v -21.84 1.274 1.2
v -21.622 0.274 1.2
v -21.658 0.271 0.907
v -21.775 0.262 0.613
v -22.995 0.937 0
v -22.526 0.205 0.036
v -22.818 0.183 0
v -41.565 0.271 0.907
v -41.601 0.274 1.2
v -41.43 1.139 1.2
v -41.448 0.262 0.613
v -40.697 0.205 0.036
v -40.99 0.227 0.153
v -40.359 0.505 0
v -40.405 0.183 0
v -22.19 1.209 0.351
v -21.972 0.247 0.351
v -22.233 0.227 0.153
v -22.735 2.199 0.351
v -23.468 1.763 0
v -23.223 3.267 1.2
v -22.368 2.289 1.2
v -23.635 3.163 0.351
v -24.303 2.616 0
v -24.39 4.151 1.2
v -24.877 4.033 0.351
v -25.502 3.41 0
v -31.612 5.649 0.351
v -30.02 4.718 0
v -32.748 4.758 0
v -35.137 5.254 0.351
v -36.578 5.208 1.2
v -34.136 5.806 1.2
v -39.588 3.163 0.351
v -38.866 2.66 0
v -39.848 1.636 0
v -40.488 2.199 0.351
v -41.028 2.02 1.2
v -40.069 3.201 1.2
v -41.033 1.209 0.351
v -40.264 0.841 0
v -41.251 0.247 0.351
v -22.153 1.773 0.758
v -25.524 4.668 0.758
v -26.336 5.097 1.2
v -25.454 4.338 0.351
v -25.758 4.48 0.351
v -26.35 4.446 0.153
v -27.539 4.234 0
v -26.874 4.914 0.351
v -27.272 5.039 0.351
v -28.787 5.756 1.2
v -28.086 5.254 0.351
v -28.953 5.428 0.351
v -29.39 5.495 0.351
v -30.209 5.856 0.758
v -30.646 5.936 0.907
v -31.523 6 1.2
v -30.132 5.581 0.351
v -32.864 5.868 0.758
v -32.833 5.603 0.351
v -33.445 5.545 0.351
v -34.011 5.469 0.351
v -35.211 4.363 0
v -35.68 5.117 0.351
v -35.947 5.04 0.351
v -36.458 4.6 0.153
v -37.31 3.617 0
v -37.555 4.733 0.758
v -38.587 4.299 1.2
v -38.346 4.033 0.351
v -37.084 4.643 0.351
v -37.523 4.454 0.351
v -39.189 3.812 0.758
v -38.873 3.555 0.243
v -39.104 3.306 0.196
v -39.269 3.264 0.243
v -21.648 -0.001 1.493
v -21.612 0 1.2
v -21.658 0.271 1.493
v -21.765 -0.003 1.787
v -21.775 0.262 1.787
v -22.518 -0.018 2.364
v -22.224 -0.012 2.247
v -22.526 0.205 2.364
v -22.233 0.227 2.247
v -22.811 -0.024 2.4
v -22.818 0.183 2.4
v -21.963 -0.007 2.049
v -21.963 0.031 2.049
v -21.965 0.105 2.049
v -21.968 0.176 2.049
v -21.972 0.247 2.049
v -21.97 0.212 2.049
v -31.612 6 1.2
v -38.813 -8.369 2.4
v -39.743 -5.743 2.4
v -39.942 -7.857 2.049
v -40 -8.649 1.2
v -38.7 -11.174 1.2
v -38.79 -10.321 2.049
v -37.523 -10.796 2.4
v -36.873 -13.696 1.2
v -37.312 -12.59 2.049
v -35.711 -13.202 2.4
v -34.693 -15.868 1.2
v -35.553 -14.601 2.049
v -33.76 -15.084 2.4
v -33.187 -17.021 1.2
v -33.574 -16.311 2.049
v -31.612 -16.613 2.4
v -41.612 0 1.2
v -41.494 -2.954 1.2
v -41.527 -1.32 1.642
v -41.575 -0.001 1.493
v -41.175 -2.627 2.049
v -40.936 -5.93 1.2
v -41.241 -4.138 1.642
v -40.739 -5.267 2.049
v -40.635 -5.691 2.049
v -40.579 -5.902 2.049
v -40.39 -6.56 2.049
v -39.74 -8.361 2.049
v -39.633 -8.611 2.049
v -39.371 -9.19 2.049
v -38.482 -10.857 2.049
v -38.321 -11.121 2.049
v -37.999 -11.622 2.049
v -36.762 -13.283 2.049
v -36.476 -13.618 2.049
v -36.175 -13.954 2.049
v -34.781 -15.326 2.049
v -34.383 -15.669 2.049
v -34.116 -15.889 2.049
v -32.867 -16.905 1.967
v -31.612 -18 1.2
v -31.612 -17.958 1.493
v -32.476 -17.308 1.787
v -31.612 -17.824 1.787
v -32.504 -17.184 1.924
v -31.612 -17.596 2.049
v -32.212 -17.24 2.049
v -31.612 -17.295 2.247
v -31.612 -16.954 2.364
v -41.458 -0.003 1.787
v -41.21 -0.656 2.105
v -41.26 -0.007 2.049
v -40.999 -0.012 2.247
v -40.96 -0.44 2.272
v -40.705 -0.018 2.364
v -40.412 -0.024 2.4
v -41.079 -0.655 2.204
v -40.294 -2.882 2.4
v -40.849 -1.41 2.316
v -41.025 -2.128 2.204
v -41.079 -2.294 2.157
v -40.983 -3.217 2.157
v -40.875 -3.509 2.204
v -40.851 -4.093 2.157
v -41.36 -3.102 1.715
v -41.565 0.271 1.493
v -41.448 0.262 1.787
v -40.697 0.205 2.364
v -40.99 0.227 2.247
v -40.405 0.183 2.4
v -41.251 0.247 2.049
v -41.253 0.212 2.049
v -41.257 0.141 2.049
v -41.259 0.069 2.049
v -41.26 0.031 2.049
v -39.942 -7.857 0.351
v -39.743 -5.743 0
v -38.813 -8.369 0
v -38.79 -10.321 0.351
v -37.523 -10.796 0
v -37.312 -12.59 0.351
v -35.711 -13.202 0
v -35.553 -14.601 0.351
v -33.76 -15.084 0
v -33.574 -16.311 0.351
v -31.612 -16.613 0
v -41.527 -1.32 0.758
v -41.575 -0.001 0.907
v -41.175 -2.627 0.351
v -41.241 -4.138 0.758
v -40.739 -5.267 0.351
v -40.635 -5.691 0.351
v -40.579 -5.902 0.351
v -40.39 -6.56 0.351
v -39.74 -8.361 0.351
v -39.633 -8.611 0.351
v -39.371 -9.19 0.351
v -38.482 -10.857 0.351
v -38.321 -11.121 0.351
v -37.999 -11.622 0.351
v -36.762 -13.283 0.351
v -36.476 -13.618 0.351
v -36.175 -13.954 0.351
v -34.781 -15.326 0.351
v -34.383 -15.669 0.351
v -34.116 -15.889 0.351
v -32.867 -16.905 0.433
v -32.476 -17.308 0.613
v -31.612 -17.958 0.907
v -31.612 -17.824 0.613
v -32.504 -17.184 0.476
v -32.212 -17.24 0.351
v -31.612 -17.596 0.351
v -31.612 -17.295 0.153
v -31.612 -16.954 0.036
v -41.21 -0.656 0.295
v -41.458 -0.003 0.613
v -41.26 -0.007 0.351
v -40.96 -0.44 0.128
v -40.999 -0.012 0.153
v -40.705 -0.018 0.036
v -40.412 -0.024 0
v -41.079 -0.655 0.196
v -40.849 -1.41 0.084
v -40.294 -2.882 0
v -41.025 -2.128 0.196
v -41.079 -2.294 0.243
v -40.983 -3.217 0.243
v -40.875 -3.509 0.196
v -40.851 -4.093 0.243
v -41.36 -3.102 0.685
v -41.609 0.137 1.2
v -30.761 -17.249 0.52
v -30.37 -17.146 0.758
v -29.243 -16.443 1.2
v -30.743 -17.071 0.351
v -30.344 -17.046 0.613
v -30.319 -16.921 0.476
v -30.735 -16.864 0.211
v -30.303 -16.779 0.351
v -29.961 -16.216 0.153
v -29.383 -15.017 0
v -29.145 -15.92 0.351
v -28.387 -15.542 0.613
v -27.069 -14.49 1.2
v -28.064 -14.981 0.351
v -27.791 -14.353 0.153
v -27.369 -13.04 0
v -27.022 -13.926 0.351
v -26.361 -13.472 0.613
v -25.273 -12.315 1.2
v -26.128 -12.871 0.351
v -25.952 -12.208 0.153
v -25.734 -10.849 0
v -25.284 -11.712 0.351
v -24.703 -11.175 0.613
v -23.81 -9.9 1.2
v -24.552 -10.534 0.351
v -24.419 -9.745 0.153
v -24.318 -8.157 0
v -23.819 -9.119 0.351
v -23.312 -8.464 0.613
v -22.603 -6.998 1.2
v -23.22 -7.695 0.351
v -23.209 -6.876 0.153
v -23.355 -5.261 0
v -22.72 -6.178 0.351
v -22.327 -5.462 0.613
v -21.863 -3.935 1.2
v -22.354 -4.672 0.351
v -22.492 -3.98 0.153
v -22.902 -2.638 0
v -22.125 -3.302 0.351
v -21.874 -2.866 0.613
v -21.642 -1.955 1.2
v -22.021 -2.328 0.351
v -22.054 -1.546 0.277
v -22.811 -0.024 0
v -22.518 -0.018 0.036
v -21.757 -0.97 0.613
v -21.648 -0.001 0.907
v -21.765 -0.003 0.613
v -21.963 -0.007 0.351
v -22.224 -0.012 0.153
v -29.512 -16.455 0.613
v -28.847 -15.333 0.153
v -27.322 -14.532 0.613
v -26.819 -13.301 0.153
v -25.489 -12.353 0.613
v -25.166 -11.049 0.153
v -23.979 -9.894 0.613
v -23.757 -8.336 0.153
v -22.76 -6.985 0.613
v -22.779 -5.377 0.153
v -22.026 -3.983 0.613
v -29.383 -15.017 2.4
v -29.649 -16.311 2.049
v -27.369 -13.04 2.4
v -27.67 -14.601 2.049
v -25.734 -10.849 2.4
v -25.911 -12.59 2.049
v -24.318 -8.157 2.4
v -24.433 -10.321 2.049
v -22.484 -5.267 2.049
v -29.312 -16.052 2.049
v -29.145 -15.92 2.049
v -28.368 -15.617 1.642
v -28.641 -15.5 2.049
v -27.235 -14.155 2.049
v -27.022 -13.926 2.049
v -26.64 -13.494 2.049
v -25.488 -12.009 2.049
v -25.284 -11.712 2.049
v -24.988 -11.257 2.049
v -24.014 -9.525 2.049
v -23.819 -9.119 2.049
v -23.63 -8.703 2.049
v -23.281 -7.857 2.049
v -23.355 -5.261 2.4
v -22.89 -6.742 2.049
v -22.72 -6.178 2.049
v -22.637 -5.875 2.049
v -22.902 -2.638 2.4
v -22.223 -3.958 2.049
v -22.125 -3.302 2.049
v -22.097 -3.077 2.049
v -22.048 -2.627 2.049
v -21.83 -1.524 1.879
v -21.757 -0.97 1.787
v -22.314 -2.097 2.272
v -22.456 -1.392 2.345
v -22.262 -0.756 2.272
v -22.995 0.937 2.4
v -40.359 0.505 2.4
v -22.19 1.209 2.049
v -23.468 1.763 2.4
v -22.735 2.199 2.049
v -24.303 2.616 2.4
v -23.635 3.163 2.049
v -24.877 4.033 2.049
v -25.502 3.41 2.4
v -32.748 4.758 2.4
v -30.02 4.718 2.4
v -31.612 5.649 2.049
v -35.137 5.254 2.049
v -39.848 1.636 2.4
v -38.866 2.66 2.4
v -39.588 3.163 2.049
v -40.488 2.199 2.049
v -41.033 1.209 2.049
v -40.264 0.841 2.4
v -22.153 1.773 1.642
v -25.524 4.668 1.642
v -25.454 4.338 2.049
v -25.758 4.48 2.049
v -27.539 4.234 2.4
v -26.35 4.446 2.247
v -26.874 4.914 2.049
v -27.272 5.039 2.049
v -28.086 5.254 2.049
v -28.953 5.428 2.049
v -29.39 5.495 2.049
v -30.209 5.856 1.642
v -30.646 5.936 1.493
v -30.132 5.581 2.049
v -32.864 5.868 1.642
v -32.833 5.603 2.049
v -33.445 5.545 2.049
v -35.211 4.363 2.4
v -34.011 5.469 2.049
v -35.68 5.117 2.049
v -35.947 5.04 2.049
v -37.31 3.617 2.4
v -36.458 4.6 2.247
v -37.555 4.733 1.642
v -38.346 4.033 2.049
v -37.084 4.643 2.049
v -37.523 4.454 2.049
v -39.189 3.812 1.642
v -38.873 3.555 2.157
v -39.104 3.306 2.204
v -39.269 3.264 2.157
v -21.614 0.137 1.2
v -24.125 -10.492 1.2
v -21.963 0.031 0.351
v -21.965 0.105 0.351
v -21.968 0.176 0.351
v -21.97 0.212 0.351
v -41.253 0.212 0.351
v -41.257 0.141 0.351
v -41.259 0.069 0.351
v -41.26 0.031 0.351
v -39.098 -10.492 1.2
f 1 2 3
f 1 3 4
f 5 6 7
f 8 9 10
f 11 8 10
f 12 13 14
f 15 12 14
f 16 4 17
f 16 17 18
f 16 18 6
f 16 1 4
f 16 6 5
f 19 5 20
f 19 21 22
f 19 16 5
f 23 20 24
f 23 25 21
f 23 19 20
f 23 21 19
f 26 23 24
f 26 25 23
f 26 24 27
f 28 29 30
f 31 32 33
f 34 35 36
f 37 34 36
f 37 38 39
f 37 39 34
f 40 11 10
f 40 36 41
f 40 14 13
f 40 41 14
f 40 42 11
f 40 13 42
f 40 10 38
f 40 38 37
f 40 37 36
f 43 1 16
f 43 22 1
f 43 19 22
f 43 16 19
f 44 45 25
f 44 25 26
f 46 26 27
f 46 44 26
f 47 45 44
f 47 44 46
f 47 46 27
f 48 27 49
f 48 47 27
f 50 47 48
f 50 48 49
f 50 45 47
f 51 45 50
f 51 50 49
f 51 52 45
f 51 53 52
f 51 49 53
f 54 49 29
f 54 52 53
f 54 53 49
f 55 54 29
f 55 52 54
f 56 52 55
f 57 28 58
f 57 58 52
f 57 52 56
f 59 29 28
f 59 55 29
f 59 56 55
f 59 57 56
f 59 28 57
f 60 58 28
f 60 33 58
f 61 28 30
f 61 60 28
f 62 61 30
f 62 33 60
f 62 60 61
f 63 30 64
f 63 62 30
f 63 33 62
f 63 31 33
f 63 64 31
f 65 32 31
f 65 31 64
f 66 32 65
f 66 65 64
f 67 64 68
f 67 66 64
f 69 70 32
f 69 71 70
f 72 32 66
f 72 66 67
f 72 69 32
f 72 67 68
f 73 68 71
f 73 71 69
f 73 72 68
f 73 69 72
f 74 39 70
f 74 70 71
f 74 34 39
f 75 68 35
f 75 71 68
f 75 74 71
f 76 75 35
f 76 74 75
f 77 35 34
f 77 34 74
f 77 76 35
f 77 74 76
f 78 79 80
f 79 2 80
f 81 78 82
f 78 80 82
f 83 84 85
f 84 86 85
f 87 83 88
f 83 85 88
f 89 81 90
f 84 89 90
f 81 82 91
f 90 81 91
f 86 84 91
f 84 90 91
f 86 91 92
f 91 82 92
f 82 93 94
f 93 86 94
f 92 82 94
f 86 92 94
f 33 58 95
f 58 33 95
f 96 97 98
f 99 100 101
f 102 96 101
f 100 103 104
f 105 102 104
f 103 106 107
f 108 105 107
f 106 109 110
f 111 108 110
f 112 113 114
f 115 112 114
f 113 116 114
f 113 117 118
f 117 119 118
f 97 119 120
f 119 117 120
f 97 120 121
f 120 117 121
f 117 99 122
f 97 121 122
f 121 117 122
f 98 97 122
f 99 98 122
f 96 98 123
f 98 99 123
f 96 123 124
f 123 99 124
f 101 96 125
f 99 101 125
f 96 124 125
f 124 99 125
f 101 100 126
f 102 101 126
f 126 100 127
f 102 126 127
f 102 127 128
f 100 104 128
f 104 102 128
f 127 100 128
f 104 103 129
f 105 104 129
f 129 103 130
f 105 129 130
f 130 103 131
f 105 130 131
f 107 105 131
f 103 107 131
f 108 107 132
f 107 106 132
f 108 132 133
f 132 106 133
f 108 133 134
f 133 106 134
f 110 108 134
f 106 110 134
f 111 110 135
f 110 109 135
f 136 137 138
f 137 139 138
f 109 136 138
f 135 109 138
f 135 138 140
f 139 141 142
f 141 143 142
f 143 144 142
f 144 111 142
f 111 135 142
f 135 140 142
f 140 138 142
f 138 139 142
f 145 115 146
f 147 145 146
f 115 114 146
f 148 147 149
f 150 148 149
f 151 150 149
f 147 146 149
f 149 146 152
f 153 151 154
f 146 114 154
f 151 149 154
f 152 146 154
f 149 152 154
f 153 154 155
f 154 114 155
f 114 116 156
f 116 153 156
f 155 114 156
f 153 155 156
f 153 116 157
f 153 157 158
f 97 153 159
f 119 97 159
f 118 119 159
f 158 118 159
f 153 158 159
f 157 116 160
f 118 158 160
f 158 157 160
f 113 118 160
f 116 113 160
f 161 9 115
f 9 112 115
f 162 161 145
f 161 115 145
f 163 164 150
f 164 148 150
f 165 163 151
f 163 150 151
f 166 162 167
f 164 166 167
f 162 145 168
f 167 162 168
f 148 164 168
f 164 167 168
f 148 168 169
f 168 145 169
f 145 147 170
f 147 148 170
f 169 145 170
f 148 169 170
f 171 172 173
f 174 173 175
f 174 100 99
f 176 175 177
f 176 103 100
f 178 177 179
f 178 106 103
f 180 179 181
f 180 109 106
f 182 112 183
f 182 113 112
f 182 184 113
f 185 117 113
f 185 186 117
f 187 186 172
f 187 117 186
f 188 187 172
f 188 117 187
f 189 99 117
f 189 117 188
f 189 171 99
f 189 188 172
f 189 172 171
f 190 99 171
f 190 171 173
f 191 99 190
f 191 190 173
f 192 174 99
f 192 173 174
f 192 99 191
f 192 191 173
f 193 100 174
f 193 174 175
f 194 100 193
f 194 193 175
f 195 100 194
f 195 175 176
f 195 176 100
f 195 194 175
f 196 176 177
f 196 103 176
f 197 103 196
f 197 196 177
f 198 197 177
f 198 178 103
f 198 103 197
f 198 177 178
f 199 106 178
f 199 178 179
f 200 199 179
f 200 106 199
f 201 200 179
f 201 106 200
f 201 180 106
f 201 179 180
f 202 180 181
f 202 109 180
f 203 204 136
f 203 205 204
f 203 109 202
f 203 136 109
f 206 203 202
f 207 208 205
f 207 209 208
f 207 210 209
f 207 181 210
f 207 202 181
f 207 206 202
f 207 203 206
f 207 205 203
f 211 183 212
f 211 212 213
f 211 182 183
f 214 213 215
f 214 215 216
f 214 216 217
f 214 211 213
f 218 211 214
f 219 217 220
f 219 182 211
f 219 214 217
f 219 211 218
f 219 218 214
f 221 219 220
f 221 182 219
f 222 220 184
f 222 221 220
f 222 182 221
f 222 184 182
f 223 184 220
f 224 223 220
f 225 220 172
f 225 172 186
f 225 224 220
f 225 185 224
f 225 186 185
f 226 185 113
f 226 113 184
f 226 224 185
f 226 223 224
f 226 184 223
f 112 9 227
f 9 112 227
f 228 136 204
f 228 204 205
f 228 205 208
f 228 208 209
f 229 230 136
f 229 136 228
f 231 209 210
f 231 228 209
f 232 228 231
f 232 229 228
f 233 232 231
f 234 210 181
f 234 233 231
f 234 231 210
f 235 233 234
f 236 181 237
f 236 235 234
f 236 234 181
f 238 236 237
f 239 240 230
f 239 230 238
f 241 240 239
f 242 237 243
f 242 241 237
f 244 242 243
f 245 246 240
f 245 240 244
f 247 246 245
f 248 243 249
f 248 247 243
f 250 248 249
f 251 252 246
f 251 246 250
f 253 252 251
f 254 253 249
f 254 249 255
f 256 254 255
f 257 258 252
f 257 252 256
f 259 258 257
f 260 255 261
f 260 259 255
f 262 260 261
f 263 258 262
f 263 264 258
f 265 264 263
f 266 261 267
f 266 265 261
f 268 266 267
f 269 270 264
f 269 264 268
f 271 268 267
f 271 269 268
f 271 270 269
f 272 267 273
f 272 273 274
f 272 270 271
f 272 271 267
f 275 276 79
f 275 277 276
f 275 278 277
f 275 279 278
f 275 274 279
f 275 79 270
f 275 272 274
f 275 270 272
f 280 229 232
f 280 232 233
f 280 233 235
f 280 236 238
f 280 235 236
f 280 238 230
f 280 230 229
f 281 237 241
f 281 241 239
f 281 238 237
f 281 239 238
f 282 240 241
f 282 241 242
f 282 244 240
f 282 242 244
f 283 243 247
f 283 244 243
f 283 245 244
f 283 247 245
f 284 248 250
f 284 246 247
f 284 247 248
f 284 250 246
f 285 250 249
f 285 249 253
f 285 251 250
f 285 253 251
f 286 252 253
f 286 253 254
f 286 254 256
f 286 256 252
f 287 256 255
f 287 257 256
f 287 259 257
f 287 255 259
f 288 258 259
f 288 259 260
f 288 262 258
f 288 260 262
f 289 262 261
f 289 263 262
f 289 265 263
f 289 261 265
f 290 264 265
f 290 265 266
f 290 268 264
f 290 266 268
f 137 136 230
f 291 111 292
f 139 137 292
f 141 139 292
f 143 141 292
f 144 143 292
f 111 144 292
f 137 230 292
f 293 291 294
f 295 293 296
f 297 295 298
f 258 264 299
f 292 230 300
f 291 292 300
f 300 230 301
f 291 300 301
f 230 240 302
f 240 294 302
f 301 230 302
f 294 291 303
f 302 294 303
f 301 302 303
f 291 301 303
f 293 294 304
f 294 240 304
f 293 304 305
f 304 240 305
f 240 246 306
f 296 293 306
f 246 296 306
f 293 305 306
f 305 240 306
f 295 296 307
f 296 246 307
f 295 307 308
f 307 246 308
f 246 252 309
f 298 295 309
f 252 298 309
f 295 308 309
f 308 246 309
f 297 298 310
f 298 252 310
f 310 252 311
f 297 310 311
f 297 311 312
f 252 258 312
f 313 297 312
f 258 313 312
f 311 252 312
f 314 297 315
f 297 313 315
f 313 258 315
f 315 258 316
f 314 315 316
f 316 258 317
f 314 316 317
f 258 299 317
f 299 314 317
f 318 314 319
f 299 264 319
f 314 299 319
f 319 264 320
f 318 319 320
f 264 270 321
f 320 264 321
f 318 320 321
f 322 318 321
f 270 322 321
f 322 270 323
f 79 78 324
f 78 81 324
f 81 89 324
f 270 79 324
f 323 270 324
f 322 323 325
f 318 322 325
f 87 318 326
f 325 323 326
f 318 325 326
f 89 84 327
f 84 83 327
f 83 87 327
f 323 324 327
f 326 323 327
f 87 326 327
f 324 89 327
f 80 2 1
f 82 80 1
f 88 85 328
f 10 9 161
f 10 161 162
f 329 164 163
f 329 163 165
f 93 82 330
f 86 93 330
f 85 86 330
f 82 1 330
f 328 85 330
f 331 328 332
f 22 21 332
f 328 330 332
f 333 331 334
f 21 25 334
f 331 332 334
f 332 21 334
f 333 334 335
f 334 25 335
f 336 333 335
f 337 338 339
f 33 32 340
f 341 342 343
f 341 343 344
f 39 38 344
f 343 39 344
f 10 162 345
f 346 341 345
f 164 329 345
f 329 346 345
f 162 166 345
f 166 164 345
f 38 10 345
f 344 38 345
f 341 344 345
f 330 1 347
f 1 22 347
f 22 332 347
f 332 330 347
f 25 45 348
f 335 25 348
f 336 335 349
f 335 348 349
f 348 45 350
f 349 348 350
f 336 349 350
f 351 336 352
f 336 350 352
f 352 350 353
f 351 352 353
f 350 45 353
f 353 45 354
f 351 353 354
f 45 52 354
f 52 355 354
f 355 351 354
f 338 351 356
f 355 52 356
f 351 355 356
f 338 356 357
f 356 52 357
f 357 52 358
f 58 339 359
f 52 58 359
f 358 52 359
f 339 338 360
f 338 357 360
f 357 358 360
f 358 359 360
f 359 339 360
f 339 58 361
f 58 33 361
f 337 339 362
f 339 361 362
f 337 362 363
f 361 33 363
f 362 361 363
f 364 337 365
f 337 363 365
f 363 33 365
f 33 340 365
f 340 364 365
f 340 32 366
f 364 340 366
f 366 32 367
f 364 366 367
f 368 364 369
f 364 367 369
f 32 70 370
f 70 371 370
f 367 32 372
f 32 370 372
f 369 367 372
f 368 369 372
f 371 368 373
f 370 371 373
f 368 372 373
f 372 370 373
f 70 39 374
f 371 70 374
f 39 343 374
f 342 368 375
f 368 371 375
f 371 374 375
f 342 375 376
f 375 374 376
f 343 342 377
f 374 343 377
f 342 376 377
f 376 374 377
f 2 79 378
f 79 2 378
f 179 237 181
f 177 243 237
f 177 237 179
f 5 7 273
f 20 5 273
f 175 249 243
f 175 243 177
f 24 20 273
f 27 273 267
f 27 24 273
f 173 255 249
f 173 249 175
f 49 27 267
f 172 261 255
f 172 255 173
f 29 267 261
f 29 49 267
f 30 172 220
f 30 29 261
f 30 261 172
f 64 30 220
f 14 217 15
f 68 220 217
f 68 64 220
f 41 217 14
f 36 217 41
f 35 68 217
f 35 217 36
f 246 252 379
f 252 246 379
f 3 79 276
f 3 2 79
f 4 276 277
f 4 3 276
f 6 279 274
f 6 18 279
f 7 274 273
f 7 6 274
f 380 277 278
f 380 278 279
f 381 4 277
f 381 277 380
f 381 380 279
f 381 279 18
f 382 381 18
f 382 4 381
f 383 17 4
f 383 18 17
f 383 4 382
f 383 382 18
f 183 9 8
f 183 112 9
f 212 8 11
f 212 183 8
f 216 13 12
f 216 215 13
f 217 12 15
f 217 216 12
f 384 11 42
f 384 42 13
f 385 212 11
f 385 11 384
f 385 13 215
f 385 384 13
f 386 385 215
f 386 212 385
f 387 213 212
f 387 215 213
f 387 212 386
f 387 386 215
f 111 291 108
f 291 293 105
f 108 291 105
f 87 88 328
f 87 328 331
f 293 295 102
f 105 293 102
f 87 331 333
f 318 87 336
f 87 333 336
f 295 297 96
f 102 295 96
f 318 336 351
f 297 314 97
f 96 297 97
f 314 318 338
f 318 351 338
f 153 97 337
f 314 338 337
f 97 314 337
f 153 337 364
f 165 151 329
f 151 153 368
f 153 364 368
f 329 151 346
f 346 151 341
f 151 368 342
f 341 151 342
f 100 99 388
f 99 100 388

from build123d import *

# Parameters (mm, degrees)
F1_DEPTH = 2.4
F2_R     = 1.1999


# Not quite as in the source:
# - a fillet or chamfer is up to 0.001 mm smaller than in the source, because OpenCascade refuses the exact size


with BuildPart() as f1:
    # F0 (on Top) → F1 (new body)
    with BuildSketch(Plane.XY):
        with BuildLine():
            add(Edge.make_bspline(
                [(-21.6115170717, 0), (-21.6158181441, 0.1367741011), (-21.6219144077, 0.2735359227)],
                knots=[1.0795807164, 1.0795807164, 1.0795807164, 1.0929807321, 1.0929807321, 1.0929807321], degree=2, weights=[1, 0.999977555, 1]))
            add(Edge.make_bspline(
                [(-21.6115170717, 0), (-21.6115170717, 0.1368390995), (-21.6219144077, 0.2735359227)],
                knots=[0, 0, 0, 0.0456051273, 0.0456051273, 0.0456051273], degree=2, weights=[1, 0.9997400328, 1]))
        make_face()
        with BuildLine():
            add(Edge.make_bspline(
                [(-31.6115170717, -18), (-21.2269016871, -12.2307692308), (-21.6115170717, 0)],
                knots=[0, 0, 0, 1.0795807164, 1.0795807164, 1.0795807164], degree=2, weights=[1, 0.8578164469, 1]))
            add(Edge.make_bspline(
                [(-21.6115170717, 0), (-21.6158181441, 0.1367741011), (-21.6219144077, 0.2735359227)],
                knots=[1.0795807164, 1.0795807164, 1.0795807164, 1.0929807321, 1.0929807321, 1.0929807321], degree=2, weights=[1, 0.999977555, 1]))
            add(Edge.make_bspline(
                [(-21.6219144077, 0.2735359227), (-22.0574766194, 6), (-31.6115170717, 6), (-41.165557524, 6), (-41.6011197358, 0.2735359227)],
                knots=[0.0456051273, 0.0456051273, 0.0456051273, 1.5707963268, 1.5707963268, 3.0959875263, 3.0959875263, 3.0959875263], degree=2, weights=[1, 0.7230454068, 1, 0.7230454068, 1]))
            add(Edge.make_bspline(
                [(-41.6011197358, 0.2735359227), (-41.6072159994, 0.1367741011), (-41.6115170717, 0)],
                knots=[5.1902045751, 5.1902045751, 5.1902045751, 5.2036045908, 5.2036045908, 5.2036045908], degree=2, weights=[1, 0.999977555, 1]))
            add(Edge.make_bspline(
                [(-41.6115170717, 0), (-41.9961324563, -12.2307692308), (-31.6115170717, -18)],
                knots=[5.2036045908, 5.2036045908, 5.2036045908, 6.2831853072, 6.2831853072, 6.2831853072], degree=2, weights=[1, 0.8578164469, 1]))
        make_face()
        with BuildLine():
            add(Edge.make_bspline(
                [(-41.6011197358, 0.2735359227), (-41.6072159994, 0.1367741011), (-41.6115170717, 0)],
                knots=[5.1902045751, 5.1902045751, 5.1902045751, 5.2036045908, 5.2036045908, 5.2036045908], degree=2, weights=[1, 0.999977555, 1]))
            add(Edge.make_bspline(
                [(-41.6011197358, 0.2735359227), (-41.6115170717, 0.1368390995), (-41.6115170717, 0)],
                knots=[3.0959875263, 3.0959875263, 3.0959875263, 3.1415926536, 3.1415926536, 3.1415926536], degree=2, weights=[1, 0.9997400328, 1]))
        make_face()
    extrude(amount=F1_DEPTH)

    # F2 (radius 1.2 in the source; OpenCascade refuses exactly that, so slightly less here)
    f2_edges = [f1.edges().sort_by_distance(p)[0] for p in [
        (-31.611517, 6, 2.4),
        (-24.081962, -10.413403, 2.4),
        (-39.141072, -10.413403, 2.4),
        (-31.611517, 6, 0),
        (-24.081962, -10.413403, 0),
        (-39.141072, -10.413403, 0),
    ]]
    fillet(f2_edges, radius=F2_R)


solid = f1.part
